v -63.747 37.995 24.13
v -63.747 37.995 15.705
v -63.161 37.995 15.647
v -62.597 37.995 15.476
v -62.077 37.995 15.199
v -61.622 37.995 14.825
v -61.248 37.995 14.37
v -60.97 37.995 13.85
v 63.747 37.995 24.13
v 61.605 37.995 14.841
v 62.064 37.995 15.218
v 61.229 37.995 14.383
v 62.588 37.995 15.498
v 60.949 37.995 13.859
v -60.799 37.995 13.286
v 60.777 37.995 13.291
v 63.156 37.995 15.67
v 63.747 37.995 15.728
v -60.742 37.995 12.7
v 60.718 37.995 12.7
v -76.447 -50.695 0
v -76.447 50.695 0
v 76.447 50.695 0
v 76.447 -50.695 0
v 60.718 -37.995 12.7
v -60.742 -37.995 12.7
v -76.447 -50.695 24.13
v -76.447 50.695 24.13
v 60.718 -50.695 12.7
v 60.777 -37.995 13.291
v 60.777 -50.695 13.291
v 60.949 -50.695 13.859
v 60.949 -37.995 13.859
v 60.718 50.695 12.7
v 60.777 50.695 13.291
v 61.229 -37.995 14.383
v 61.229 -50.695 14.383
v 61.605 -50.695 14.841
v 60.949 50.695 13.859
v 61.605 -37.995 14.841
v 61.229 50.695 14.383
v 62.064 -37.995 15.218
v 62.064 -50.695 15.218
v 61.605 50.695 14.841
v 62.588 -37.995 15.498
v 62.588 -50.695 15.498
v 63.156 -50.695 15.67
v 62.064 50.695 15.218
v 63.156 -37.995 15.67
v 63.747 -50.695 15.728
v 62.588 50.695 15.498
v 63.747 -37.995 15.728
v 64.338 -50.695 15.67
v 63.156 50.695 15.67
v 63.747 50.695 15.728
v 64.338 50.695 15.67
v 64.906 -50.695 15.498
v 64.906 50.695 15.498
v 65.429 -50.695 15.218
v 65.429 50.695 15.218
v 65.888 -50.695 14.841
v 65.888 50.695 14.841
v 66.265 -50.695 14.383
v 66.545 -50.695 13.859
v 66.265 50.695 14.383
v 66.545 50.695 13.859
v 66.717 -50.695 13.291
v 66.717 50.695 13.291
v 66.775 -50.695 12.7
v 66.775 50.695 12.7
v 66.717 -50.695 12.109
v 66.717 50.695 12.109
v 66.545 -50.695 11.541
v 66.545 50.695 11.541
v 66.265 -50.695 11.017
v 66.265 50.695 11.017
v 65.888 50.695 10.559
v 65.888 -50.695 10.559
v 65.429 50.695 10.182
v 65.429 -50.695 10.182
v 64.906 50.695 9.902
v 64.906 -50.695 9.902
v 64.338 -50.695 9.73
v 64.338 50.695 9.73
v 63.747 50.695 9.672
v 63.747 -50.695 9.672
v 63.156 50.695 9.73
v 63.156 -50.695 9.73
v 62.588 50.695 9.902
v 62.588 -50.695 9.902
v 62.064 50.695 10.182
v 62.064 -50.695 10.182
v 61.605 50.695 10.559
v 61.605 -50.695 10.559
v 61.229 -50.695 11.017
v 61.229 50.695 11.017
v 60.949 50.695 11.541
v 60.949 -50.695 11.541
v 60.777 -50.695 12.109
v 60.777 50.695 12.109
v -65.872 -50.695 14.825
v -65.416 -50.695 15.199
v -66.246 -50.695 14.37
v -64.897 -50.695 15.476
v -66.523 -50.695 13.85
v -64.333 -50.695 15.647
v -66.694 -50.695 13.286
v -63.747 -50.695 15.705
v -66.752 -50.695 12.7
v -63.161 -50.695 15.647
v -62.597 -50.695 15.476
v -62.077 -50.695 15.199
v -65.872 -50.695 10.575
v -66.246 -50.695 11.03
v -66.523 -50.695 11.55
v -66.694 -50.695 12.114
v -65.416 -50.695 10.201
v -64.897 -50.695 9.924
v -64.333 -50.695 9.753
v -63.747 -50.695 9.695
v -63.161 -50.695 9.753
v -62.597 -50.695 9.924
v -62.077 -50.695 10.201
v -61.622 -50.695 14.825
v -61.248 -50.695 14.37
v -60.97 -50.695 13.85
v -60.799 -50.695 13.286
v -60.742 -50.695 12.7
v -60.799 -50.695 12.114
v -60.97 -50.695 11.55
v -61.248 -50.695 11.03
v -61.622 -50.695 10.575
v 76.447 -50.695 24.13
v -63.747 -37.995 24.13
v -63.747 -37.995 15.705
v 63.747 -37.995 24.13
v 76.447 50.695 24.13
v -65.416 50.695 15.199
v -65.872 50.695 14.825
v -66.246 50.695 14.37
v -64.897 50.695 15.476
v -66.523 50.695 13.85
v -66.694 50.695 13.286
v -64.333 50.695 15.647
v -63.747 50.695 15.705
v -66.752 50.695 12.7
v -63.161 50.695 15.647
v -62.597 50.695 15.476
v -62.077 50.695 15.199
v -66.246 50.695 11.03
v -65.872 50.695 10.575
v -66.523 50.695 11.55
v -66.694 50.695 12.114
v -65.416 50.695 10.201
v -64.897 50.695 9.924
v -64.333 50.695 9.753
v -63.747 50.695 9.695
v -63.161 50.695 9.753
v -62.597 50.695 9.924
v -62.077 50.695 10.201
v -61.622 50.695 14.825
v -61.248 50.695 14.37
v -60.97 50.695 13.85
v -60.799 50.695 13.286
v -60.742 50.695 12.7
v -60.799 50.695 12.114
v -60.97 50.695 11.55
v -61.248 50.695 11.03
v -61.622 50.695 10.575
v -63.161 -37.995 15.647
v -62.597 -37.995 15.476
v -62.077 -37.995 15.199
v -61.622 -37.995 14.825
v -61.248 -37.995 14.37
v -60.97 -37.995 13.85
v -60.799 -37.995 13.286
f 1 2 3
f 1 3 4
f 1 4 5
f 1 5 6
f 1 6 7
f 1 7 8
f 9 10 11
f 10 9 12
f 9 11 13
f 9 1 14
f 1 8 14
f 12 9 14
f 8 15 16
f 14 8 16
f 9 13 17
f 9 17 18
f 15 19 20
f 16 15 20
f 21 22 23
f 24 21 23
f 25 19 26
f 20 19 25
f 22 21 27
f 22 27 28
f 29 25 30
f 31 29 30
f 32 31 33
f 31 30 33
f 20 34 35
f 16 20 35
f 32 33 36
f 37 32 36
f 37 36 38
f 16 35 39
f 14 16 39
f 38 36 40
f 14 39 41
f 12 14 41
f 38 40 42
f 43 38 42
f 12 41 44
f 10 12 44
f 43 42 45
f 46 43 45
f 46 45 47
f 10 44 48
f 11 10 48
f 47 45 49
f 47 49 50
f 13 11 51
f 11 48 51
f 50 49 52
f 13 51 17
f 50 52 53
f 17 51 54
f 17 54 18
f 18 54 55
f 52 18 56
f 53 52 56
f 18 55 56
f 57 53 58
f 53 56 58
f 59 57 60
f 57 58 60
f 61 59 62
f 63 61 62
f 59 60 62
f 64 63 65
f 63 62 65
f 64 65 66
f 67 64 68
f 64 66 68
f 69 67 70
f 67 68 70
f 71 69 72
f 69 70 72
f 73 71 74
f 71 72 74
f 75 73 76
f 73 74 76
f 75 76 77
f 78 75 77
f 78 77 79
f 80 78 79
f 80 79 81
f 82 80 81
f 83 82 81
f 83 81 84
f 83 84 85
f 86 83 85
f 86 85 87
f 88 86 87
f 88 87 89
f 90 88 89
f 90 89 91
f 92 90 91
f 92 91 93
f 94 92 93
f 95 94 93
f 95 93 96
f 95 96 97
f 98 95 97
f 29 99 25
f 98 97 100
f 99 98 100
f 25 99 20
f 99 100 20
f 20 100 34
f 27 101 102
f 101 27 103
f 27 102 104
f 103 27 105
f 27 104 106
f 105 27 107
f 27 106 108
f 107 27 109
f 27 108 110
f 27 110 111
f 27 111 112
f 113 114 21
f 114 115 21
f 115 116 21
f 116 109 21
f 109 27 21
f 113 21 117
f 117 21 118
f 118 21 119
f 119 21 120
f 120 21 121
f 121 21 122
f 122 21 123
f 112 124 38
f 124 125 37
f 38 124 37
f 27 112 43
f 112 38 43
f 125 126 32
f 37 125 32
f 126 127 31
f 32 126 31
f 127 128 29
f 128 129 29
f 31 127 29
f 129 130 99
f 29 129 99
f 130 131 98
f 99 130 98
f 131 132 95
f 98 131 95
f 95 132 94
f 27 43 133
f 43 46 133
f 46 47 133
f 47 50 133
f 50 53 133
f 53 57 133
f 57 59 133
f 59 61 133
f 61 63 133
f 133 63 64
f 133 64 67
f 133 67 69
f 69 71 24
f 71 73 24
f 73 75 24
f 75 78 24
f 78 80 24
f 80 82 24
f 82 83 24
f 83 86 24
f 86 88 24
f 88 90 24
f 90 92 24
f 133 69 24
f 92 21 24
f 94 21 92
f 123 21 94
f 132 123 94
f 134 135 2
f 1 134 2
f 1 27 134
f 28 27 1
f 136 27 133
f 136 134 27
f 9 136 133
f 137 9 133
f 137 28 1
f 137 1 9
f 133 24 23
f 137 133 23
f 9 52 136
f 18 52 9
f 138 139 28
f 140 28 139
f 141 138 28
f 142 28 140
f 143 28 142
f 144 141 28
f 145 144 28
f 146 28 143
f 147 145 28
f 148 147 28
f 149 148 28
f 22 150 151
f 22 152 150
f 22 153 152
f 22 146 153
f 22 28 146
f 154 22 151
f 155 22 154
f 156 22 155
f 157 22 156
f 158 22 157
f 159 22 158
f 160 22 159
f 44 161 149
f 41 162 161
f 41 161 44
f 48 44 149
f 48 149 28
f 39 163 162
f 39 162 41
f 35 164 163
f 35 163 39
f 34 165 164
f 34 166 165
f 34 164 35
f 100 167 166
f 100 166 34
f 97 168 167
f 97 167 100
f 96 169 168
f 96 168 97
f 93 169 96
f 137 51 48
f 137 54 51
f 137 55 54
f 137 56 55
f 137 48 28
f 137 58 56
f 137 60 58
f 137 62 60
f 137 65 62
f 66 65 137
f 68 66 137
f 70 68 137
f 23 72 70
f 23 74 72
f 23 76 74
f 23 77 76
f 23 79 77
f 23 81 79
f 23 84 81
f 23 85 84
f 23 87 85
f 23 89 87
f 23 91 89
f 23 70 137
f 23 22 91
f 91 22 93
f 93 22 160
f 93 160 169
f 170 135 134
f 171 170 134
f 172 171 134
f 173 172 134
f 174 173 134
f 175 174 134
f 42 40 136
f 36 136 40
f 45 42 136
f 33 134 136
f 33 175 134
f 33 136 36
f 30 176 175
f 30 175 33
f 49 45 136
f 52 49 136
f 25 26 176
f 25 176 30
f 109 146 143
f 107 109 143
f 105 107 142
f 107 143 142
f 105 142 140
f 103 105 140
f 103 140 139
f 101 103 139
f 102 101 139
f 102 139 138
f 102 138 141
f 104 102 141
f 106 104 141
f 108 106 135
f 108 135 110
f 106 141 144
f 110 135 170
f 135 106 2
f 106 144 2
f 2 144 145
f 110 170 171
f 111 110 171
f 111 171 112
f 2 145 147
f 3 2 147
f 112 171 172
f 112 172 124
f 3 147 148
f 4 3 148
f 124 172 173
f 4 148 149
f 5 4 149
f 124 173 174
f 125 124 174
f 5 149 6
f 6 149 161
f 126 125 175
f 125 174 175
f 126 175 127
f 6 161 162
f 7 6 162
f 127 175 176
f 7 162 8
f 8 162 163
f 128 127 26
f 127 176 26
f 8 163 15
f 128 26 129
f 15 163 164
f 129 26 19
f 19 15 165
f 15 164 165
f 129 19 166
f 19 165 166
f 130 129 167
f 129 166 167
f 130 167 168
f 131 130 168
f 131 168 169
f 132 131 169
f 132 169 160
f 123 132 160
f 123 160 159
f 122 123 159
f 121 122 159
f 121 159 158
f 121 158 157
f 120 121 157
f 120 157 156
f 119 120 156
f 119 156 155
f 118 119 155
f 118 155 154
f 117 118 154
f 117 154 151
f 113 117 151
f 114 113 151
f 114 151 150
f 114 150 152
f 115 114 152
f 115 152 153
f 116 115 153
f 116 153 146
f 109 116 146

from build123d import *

# Parameters (mm, degrees)
F0_W     = 152.893602
F0_H     = 101.389184
F1_DEPTH = 24.13
F2_T     = -12.7
F3_R     = 3.028448
F3_R_2   = 3.005177
F4_DEPTH = 101.389185


with BuildPart() as f1:
    # F0 (on Top) → F1 (new body)
    with BuildSketch(Plane.XY):
        Rectangle(F0_W, F0_H)
    extrude(amount=F1_DEPTH)

    # F2
    f2_openings = [f1.faces().sort_by_distance(p)[0] for p in [
        (0, 0, 24.13),
    ]]
    offset(amount=F2_T, openings=f2_openings)

    # F3 (on face) → F4 (cut, through all)
    with BuildSketch(Plane(origin=(0, 50.694592, 0), x_dir=(-1, 0, 0), z_dir=(0, 1, 0))):
        with Locations((-63.746801, 12.7)):
            Circle(F3_R)
        with Locations((63.746801, 12.7)):
            Circle(F3_R_2)
    extrude(amount=-F4_DEPTH, mode=Mode.SUBTRACT)


solid = f1.part
